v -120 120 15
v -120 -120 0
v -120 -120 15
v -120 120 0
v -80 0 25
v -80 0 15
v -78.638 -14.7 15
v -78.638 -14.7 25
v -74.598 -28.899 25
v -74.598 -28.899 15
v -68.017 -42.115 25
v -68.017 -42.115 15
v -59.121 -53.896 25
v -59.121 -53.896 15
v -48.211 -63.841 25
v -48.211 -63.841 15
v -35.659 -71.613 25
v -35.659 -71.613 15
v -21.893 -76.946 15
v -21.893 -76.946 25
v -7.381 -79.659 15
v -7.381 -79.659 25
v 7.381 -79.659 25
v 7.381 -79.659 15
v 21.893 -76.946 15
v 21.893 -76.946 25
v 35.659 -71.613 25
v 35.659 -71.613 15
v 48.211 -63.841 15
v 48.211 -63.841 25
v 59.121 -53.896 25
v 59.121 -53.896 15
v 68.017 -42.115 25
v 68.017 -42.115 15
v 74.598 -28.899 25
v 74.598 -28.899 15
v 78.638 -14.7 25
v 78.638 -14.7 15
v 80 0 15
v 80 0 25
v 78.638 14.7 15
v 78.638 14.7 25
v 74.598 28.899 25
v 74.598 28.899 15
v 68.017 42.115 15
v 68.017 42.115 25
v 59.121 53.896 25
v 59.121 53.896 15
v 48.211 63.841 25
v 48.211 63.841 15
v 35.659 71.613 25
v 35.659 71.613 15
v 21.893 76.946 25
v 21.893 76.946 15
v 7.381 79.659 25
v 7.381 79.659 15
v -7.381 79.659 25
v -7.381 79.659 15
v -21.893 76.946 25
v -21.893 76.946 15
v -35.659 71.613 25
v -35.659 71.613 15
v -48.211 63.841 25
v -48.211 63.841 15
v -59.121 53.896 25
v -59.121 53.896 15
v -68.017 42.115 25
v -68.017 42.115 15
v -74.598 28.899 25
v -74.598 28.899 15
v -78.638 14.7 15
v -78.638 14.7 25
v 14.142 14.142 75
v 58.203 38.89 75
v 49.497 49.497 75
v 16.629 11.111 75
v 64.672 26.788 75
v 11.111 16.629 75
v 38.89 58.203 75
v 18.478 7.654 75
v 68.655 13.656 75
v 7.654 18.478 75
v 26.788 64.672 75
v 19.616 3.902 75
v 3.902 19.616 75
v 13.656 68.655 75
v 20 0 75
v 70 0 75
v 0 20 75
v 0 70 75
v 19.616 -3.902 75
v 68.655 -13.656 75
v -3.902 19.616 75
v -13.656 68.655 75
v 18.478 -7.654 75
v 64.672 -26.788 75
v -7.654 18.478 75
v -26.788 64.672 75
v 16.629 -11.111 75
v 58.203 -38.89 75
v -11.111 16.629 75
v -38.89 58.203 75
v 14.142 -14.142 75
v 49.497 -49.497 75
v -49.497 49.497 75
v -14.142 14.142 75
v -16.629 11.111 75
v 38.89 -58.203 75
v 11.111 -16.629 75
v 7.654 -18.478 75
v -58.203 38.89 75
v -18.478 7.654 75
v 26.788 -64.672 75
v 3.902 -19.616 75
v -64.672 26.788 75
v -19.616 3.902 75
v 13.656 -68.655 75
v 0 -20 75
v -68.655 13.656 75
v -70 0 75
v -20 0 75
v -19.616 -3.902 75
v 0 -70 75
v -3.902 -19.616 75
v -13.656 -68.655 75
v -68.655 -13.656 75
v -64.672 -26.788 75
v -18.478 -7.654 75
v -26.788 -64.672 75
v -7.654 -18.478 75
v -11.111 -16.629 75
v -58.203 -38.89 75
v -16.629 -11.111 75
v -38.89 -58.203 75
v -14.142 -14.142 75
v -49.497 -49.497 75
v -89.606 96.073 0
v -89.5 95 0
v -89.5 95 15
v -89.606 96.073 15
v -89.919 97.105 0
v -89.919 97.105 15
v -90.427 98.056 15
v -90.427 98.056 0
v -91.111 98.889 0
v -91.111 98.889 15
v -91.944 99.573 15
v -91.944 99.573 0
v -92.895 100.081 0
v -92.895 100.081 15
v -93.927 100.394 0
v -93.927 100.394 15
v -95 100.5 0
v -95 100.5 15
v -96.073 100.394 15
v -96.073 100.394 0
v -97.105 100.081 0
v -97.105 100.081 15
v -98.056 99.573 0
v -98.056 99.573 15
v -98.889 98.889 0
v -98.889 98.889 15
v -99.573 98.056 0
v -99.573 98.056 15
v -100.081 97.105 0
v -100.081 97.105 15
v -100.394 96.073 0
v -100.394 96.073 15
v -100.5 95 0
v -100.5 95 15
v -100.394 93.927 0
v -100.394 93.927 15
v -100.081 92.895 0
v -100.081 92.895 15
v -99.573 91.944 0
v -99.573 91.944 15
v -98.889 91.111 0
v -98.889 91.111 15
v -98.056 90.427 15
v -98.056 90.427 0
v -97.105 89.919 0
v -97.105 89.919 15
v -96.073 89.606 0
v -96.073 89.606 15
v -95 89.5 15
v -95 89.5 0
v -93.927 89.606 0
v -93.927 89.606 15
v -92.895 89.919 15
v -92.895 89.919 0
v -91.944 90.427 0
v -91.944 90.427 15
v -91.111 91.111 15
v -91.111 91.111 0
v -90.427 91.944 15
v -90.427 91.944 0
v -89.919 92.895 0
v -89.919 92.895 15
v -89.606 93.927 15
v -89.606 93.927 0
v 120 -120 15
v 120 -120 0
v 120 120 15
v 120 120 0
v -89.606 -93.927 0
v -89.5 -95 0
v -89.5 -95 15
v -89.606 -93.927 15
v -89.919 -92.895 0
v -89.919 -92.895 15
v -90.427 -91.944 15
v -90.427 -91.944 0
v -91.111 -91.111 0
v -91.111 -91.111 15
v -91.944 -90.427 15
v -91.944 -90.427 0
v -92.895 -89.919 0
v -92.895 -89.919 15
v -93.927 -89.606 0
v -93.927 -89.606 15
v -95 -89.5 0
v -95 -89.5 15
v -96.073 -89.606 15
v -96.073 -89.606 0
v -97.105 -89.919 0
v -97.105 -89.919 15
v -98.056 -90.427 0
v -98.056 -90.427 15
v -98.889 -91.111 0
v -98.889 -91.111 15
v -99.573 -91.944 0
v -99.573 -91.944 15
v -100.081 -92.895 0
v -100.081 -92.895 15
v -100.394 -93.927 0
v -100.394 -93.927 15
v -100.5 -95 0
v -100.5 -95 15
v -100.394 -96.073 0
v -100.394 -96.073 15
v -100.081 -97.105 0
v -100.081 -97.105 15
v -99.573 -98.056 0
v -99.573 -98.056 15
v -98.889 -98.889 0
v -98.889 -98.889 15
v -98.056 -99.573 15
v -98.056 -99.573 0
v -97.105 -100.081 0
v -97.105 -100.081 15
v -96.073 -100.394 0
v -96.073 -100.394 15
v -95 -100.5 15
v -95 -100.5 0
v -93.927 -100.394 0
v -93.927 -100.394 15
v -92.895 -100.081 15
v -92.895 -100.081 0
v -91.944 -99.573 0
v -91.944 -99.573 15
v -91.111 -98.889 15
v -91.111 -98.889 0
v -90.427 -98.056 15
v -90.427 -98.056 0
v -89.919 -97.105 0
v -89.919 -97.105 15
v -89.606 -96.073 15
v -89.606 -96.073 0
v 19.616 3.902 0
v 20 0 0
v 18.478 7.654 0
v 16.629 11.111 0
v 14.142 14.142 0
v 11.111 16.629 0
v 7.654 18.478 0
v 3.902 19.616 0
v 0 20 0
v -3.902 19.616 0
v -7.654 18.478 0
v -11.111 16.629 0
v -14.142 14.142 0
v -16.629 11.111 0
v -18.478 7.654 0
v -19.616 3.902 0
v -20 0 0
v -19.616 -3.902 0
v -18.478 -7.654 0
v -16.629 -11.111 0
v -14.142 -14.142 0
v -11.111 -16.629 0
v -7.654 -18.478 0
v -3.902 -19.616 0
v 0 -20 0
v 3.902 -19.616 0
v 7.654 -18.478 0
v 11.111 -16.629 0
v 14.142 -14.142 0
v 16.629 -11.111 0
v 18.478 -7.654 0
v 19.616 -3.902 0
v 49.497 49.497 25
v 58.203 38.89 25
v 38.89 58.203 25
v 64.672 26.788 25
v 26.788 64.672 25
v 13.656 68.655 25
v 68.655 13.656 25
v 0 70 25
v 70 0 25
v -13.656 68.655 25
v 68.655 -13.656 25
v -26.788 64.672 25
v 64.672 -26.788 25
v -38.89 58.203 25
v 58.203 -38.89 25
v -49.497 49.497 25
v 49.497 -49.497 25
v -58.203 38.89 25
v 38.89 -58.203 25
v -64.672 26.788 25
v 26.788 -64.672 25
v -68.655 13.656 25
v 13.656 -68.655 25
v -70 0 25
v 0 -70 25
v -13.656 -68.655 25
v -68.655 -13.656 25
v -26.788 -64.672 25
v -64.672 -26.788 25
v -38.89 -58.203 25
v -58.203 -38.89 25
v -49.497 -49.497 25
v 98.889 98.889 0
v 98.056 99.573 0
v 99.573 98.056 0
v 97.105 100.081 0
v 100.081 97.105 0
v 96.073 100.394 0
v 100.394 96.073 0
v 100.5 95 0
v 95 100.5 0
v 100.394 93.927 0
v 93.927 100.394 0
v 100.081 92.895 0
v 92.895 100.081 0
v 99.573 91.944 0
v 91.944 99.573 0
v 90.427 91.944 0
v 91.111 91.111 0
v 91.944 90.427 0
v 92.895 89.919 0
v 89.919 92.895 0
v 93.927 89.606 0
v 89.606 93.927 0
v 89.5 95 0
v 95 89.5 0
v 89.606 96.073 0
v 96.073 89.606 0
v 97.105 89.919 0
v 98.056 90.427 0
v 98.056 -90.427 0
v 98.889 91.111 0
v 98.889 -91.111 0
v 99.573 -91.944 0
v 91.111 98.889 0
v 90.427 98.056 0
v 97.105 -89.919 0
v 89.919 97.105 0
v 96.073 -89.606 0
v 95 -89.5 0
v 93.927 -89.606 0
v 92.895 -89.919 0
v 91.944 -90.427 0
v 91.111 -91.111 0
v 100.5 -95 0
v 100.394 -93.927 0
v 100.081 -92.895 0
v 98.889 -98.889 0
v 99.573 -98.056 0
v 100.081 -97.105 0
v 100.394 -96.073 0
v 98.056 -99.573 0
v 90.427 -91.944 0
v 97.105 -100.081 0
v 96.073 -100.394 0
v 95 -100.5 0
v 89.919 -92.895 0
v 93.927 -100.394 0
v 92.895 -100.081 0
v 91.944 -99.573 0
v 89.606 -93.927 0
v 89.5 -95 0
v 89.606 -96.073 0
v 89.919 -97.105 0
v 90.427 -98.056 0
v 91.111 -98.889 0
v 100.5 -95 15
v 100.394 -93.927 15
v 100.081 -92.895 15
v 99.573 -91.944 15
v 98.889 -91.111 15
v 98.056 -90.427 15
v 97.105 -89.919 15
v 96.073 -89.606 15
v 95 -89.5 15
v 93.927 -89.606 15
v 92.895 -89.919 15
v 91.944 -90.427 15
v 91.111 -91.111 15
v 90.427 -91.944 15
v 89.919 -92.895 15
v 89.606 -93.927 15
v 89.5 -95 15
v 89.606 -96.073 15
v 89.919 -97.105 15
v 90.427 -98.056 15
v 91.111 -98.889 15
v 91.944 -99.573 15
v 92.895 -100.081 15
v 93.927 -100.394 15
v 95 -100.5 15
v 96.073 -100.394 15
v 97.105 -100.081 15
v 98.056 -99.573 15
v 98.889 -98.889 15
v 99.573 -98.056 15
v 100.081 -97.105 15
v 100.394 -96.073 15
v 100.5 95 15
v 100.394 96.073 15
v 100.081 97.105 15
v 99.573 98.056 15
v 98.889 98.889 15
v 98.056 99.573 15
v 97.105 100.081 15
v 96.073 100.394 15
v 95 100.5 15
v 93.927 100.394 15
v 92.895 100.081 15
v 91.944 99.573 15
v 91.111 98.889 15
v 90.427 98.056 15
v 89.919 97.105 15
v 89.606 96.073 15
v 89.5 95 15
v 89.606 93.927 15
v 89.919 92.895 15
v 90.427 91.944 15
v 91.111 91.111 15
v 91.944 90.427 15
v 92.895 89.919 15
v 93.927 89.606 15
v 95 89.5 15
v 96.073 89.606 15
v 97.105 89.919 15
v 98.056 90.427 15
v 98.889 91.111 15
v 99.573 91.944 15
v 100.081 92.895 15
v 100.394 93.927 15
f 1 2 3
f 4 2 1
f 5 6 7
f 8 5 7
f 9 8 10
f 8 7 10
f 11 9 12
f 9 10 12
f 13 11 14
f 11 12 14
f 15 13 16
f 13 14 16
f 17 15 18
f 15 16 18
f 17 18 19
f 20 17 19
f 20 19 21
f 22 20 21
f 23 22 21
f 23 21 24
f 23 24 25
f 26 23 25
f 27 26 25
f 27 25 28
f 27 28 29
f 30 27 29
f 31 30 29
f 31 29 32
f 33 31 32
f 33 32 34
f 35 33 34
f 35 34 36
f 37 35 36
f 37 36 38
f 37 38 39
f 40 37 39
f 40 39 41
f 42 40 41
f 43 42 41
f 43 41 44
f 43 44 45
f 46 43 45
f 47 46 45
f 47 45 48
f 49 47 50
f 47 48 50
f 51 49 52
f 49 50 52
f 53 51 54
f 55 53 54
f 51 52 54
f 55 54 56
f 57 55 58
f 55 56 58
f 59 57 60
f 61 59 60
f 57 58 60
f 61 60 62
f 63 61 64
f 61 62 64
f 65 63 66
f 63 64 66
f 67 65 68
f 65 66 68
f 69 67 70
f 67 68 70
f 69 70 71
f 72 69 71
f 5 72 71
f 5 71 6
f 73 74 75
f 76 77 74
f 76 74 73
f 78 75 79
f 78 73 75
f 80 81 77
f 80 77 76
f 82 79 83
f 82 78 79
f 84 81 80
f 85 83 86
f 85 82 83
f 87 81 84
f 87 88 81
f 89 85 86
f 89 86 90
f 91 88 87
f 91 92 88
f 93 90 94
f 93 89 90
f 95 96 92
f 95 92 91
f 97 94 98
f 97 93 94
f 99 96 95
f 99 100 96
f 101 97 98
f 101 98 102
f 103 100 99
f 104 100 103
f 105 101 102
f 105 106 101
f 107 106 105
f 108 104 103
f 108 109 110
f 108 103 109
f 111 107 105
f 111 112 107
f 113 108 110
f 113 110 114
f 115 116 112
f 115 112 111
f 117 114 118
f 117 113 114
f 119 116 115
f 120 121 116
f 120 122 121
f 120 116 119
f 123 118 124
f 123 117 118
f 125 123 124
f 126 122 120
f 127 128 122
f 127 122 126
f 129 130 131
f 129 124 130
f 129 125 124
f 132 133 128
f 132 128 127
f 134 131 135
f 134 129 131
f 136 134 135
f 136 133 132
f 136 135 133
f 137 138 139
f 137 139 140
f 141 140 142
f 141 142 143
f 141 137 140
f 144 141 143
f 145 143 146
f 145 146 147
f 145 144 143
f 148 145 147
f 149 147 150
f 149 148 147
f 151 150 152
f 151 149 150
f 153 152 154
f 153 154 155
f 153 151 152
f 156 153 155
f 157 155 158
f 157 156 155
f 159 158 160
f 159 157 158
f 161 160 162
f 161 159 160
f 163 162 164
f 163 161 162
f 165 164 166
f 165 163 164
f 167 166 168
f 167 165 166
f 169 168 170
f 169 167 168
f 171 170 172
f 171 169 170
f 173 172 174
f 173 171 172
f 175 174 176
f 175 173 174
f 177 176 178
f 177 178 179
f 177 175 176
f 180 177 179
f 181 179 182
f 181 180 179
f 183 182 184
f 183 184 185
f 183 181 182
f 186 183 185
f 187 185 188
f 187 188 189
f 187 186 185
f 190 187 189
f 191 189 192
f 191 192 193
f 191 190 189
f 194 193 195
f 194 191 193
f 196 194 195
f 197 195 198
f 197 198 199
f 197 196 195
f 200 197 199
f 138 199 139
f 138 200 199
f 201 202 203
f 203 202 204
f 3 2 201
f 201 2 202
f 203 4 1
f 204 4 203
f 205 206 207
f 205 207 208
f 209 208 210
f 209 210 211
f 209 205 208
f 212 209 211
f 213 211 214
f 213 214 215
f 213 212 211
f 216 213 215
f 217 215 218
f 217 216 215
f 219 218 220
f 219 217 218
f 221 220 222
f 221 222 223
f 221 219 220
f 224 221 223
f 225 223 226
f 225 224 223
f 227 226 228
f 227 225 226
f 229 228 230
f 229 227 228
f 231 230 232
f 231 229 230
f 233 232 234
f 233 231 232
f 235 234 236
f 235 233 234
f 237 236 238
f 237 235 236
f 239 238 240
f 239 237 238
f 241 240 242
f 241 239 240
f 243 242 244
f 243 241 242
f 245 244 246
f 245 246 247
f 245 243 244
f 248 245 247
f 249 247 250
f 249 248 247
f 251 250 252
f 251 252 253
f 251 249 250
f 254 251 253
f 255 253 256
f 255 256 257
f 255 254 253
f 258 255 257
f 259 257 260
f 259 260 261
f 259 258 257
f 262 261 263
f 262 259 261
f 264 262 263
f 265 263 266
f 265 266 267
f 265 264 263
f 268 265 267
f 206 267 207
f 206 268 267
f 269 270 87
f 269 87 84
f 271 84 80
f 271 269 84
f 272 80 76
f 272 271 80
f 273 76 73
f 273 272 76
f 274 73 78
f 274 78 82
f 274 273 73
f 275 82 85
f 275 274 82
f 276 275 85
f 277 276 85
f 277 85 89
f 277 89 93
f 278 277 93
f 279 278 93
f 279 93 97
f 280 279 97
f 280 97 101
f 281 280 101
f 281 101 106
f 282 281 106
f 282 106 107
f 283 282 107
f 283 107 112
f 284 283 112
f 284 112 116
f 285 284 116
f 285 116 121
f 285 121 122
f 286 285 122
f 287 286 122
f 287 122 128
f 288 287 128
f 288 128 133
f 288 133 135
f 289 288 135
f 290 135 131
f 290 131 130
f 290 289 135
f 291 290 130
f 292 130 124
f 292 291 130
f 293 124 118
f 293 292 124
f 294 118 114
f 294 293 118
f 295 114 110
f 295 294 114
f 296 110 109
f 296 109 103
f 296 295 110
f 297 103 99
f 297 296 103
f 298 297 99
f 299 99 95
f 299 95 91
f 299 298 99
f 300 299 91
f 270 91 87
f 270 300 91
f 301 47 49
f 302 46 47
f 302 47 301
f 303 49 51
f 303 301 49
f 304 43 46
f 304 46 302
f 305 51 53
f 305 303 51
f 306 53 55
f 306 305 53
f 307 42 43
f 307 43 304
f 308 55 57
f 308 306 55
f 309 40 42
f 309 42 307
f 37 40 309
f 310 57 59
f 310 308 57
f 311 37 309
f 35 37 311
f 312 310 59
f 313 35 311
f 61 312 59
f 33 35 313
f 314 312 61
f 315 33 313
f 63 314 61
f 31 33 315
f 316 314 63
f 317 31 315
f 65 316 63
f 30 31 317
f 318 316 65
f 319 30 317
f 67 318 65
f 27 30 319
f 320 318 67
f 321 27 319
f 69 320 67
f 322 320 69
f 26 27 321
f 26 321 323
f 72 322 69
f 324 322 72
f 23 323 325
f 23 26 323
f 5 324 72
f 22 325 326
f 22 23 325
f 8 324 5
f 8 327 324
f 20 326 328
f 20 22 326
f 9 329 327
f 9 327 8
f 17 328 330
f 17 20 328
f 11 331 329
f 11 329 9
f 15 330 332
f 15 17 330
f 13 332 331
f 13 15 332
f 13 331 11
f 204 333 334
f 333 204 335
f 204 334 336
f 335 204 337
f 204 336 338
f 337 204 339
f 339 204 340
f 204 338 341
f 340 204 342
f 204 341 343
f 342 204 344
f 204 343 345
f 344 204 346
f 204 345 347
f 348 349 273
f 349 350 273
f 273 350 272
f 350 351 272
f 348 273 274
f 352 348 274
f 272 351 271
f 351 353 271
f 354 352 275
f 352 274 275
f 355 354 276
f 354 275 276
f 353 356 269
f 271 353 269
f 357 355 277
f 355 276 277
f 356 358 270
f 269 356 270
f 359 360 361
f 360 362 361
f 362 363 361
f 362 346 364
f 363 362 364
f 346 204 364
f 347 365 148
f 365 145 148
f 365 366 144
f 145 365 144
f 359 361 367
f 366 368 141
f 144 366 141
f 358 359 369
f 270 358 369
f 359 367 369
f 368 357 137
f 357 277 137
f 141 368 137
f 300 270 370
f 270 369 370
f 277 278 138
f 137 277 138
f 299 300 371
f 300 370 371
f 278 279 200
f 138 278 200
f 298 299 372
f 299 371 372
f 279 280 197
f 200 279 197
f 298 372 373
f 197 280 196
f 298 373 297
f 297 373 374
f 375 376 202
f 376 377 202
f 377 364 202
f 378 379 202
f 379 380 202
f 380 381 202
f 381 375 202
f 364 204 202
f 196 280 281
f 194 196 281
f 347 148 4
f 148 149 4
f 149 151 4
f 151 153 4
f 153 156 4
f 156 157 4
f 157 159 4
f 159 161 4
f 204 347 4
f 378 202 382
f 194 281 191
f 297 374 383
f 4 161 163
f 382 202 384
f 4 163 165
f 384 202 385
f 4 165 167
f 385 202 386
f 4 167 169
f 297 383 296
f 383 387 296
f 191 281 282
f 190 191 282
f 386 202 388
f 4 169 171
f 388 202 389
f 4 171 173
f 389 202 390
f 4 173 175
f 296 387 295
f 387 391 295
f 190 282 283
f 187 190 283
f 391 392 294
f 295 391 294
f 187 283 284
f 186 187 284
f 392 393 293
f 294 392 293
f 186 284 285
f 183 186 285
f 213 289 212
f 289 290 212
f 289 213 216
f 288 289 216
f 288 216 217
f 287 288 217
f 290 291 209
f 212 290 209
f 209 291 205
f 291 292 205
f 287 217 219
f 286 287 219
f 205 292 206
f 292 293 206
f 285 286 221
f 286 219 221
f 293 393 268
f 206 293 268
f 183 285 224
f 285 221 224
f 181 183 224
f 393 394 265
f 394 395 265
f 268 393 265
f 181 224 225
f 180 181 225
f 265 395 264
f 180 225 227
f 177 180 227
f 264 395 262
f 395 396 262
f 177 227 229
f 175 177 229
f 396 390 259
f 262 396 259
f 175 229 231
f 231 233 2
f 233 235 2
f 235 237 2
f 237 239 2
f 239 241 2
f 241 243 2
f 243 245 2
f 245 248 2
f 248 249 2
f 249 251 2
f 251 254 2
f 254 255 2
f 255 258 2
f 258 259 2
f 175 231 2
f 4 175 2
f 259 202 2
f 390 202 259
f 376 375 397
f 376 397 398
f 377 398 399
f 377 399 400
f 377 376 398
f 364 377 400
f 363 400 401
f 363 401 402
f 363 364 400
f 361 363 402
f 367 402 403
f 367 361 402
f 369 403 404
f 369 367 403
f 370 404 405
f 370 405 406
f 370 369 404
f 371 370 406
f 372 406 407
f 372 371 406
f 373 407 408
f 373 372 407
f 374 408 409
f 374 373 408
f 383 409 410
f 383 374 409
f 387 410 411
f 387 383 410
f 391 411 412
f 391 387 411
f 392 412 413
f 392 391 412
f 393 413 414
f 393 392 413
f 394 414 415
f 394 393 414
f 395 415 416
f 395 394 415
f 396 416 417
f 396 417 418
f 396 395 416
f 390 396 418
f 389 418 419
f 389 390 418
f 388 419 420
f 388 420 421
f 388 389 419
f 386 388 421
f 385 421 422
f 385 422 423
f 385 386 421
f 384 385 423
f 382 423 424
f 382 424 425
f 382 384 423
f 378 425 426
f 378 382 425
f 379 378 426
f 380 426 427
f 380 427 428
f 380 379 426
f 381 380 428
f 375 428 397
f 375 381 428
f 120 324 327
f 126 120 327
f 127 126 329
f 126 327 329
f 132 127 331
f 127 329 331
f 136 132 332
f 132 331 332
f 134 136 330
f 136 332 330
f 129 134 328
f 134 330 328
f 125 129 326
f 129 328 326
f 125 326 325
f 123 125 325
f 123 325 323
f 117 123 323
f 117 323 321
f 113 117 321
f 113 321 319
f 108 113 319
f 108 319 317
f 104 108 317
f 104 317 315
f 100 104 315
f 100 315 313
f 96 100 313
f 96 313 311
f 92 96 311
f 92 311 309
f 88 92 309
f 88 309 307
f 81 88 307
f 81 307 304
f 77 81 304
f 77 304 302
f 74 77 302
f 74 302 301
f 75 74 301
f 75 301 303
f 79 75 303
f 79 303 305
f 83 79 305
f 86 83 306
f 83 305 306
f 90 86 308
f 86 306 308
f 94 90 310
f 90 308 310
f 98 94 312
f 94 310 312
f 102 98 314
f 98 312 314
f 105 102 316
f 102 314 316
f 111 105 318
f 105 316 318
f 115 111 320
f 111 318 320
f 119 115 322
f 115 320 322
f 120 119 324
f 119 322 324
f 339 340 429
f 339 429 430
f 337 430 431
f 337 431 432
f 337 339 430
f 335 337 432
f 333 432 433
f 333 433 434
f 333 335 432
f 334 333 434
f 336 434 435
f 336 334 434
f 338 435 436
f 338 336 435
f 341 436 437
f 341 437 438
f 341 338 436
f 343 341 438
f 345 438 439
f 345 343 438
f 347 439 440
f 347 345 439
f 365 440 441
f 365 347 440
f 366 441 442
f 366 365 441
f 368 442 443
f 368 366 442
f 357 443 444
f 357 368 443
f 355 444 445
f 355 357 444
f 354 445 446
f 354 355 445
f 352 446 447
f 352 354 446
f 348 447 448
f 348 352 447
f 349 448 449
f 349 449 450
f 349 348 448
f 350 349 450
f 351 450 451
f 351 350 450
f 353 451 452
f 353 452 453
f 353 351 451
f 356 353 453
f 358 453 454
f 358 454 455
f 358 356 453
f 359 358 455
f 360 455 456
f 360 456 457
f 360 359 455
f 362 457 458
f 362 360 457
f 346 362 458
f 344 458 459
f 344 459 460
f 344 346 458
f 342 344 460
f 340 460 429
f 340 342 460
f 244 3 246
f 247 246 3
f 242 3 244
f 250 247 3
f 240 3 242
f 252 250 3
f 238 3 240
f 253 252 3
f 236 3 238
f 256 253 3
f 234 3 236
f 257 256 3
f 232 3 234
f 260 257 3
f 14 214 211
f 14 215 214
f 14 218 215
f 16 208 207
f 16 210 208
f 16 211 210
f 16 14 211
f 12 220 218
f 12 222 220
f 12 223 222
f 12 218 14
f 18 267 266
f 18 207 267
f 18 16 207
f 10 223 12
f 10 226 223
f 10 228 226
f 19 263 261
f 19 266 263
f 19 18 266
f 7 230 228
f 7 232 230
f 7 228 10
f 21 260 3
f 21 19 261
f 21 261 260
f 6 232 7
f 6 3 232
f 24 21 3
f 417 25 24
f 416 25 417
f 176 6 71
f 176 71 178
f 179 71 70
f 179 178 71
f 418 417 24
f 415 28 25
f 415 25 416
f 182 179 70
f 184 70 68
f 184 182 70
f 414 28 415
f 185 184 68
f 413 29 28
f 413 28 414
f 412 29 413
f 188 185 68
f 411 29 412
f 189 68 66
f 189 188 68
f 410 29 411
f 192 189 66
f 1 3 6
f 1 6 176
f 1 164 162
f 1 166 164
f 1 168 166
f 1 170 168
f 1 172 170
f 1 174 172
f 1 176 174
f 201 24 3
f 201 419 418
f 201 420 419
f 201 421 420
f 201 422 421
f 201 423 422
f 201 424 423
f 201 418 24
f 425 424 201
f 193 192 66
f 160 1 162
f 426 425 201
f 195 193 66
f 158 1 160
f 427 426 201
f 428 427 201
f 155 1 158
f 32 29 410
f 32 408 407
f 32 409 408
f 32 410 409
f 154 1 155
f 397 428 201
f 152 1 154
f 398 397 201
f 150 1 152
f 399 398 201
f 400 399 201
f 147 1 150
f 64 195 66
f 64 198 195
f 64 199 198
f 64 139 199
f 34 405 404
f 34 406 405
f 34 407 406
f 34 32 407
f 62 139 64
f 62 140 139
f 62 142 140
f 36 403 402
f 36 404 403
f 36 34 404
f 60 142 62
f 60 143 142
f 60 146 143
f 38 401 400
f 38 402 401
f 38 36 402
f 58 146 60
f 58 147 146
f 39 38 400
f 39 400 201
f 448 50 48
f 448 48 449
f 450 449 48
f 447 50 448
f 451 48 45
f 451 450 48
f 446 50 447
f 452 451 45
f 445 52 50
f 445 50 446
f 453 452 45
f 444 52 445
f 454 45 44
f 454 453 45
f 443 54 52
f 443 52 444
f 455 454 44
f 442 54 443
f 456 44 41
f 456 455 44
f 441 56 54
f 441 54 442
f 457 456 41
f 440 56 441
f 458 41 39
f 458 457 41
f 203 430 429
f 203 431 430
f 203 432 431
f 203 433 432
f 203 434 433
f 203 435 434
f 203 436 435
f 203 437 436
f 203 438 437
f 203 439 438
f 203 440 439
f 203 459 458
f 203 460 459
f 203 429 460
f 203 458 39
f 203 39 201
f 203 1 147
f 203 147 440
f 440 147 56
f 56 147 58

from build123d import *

# Parameters (mm, degrees)
SKETCH1_W           = 240
SKETCH1_H           = 240
SKETCH1_R           = 20
SKETCH1_R_2         = 5.5
BOSS_EXTRUDE1_DEPTH = 15
SKETCH2_R           = 70
SKETCH2_R_2         = 20
BOSS_EXTRUDE2_DEPTH = 75
SKETCH3_R           = 80
SKETCH3_R_2         = 40
SKETCH3_R_3         = 3
BOSS_EXTRUDE3_DEPTH = 25


with BuildPart() as part:
    # Sketch1 → Boss-Extrude1 (new body)
    with BuildSketch(Plane.XY):
        Rectangle(SKETCH1_W, SKETCH1_H)
        Circle(SKETCH1_R, mode=Mode.SUBTRACT)
        with Locations((-95, -95)):
            Circle(SKETCH1_R_2, mode=Mode.SUBTRACT)
        with Locations((-95, 95)):
            Circle(SKETCH1_R_2, mode=Mode.SUBTRACT)
        with Locations((95, -95)):
            Circle(SKETCH1_R_2, mode=Mode.SUBTRACT)
        with Locations((95, 95)):
            Circle(SKETCH1_R_2, mode=Mode.SUBTRACT)
    extrude(amount=BOSS_EXTRUDE1_DEPTH)

    # Sketch2 → Boss-Extrude2 (add)
    with BuildSketch(Plane.XY):
        Circle(SKETCH2_R)
        Circle(SKETCH2_R_2, mode=Mode.SUBTRACT)
    extrude(amount=BOSS_EXTRUDE2_DEPTH)

    # Sketch3 → Boss-Extrude3 (add)
    with BuildSketch(Plane.XY):
        Circle(SKETCH3_R)
        Circle(SKETCH3_R_2, mode=Mode.SUBTRACT)
        with Locations((65, 0)):
            Circle(SKETCH3_R_3, mode=Mode.SUBTRACT)
        with Locations((45.961940777, 45.961940777)):
            Circle(SKETCH3_R_3, mode=Mode.SUBTRACT)
        with Locations((0, 65)):
            Circle(SKETCH3_R_3, mode=Mode.SUBTRACT)
        with Locations((-45.961940777, 45.961940777)):
            Circle(SKETCH3_R_3, mode=Mode.SUBTRACT)
        with Locations((-65, 0)):
            Circle(SKETCH3_R_3, mode=Mode.SUBTRACT)
        with Locations((-45.961940777, -45.961940777)):
            Circle(SKETCH3_R_3, mode=Mode.SUBTRACT)
        with Locations((0, -65)):
            Circle(SKETCH3_R_3, mode=Mode.SUBTRACT)
        with Locations((45.961940777, -45.961940777)):
            Circle(SKETCH3_R_3, mode=Mode.SUBTRACT)
    extrude(amount=BOSS_EXTRUDE3_DEPTH)


solid = part.part
